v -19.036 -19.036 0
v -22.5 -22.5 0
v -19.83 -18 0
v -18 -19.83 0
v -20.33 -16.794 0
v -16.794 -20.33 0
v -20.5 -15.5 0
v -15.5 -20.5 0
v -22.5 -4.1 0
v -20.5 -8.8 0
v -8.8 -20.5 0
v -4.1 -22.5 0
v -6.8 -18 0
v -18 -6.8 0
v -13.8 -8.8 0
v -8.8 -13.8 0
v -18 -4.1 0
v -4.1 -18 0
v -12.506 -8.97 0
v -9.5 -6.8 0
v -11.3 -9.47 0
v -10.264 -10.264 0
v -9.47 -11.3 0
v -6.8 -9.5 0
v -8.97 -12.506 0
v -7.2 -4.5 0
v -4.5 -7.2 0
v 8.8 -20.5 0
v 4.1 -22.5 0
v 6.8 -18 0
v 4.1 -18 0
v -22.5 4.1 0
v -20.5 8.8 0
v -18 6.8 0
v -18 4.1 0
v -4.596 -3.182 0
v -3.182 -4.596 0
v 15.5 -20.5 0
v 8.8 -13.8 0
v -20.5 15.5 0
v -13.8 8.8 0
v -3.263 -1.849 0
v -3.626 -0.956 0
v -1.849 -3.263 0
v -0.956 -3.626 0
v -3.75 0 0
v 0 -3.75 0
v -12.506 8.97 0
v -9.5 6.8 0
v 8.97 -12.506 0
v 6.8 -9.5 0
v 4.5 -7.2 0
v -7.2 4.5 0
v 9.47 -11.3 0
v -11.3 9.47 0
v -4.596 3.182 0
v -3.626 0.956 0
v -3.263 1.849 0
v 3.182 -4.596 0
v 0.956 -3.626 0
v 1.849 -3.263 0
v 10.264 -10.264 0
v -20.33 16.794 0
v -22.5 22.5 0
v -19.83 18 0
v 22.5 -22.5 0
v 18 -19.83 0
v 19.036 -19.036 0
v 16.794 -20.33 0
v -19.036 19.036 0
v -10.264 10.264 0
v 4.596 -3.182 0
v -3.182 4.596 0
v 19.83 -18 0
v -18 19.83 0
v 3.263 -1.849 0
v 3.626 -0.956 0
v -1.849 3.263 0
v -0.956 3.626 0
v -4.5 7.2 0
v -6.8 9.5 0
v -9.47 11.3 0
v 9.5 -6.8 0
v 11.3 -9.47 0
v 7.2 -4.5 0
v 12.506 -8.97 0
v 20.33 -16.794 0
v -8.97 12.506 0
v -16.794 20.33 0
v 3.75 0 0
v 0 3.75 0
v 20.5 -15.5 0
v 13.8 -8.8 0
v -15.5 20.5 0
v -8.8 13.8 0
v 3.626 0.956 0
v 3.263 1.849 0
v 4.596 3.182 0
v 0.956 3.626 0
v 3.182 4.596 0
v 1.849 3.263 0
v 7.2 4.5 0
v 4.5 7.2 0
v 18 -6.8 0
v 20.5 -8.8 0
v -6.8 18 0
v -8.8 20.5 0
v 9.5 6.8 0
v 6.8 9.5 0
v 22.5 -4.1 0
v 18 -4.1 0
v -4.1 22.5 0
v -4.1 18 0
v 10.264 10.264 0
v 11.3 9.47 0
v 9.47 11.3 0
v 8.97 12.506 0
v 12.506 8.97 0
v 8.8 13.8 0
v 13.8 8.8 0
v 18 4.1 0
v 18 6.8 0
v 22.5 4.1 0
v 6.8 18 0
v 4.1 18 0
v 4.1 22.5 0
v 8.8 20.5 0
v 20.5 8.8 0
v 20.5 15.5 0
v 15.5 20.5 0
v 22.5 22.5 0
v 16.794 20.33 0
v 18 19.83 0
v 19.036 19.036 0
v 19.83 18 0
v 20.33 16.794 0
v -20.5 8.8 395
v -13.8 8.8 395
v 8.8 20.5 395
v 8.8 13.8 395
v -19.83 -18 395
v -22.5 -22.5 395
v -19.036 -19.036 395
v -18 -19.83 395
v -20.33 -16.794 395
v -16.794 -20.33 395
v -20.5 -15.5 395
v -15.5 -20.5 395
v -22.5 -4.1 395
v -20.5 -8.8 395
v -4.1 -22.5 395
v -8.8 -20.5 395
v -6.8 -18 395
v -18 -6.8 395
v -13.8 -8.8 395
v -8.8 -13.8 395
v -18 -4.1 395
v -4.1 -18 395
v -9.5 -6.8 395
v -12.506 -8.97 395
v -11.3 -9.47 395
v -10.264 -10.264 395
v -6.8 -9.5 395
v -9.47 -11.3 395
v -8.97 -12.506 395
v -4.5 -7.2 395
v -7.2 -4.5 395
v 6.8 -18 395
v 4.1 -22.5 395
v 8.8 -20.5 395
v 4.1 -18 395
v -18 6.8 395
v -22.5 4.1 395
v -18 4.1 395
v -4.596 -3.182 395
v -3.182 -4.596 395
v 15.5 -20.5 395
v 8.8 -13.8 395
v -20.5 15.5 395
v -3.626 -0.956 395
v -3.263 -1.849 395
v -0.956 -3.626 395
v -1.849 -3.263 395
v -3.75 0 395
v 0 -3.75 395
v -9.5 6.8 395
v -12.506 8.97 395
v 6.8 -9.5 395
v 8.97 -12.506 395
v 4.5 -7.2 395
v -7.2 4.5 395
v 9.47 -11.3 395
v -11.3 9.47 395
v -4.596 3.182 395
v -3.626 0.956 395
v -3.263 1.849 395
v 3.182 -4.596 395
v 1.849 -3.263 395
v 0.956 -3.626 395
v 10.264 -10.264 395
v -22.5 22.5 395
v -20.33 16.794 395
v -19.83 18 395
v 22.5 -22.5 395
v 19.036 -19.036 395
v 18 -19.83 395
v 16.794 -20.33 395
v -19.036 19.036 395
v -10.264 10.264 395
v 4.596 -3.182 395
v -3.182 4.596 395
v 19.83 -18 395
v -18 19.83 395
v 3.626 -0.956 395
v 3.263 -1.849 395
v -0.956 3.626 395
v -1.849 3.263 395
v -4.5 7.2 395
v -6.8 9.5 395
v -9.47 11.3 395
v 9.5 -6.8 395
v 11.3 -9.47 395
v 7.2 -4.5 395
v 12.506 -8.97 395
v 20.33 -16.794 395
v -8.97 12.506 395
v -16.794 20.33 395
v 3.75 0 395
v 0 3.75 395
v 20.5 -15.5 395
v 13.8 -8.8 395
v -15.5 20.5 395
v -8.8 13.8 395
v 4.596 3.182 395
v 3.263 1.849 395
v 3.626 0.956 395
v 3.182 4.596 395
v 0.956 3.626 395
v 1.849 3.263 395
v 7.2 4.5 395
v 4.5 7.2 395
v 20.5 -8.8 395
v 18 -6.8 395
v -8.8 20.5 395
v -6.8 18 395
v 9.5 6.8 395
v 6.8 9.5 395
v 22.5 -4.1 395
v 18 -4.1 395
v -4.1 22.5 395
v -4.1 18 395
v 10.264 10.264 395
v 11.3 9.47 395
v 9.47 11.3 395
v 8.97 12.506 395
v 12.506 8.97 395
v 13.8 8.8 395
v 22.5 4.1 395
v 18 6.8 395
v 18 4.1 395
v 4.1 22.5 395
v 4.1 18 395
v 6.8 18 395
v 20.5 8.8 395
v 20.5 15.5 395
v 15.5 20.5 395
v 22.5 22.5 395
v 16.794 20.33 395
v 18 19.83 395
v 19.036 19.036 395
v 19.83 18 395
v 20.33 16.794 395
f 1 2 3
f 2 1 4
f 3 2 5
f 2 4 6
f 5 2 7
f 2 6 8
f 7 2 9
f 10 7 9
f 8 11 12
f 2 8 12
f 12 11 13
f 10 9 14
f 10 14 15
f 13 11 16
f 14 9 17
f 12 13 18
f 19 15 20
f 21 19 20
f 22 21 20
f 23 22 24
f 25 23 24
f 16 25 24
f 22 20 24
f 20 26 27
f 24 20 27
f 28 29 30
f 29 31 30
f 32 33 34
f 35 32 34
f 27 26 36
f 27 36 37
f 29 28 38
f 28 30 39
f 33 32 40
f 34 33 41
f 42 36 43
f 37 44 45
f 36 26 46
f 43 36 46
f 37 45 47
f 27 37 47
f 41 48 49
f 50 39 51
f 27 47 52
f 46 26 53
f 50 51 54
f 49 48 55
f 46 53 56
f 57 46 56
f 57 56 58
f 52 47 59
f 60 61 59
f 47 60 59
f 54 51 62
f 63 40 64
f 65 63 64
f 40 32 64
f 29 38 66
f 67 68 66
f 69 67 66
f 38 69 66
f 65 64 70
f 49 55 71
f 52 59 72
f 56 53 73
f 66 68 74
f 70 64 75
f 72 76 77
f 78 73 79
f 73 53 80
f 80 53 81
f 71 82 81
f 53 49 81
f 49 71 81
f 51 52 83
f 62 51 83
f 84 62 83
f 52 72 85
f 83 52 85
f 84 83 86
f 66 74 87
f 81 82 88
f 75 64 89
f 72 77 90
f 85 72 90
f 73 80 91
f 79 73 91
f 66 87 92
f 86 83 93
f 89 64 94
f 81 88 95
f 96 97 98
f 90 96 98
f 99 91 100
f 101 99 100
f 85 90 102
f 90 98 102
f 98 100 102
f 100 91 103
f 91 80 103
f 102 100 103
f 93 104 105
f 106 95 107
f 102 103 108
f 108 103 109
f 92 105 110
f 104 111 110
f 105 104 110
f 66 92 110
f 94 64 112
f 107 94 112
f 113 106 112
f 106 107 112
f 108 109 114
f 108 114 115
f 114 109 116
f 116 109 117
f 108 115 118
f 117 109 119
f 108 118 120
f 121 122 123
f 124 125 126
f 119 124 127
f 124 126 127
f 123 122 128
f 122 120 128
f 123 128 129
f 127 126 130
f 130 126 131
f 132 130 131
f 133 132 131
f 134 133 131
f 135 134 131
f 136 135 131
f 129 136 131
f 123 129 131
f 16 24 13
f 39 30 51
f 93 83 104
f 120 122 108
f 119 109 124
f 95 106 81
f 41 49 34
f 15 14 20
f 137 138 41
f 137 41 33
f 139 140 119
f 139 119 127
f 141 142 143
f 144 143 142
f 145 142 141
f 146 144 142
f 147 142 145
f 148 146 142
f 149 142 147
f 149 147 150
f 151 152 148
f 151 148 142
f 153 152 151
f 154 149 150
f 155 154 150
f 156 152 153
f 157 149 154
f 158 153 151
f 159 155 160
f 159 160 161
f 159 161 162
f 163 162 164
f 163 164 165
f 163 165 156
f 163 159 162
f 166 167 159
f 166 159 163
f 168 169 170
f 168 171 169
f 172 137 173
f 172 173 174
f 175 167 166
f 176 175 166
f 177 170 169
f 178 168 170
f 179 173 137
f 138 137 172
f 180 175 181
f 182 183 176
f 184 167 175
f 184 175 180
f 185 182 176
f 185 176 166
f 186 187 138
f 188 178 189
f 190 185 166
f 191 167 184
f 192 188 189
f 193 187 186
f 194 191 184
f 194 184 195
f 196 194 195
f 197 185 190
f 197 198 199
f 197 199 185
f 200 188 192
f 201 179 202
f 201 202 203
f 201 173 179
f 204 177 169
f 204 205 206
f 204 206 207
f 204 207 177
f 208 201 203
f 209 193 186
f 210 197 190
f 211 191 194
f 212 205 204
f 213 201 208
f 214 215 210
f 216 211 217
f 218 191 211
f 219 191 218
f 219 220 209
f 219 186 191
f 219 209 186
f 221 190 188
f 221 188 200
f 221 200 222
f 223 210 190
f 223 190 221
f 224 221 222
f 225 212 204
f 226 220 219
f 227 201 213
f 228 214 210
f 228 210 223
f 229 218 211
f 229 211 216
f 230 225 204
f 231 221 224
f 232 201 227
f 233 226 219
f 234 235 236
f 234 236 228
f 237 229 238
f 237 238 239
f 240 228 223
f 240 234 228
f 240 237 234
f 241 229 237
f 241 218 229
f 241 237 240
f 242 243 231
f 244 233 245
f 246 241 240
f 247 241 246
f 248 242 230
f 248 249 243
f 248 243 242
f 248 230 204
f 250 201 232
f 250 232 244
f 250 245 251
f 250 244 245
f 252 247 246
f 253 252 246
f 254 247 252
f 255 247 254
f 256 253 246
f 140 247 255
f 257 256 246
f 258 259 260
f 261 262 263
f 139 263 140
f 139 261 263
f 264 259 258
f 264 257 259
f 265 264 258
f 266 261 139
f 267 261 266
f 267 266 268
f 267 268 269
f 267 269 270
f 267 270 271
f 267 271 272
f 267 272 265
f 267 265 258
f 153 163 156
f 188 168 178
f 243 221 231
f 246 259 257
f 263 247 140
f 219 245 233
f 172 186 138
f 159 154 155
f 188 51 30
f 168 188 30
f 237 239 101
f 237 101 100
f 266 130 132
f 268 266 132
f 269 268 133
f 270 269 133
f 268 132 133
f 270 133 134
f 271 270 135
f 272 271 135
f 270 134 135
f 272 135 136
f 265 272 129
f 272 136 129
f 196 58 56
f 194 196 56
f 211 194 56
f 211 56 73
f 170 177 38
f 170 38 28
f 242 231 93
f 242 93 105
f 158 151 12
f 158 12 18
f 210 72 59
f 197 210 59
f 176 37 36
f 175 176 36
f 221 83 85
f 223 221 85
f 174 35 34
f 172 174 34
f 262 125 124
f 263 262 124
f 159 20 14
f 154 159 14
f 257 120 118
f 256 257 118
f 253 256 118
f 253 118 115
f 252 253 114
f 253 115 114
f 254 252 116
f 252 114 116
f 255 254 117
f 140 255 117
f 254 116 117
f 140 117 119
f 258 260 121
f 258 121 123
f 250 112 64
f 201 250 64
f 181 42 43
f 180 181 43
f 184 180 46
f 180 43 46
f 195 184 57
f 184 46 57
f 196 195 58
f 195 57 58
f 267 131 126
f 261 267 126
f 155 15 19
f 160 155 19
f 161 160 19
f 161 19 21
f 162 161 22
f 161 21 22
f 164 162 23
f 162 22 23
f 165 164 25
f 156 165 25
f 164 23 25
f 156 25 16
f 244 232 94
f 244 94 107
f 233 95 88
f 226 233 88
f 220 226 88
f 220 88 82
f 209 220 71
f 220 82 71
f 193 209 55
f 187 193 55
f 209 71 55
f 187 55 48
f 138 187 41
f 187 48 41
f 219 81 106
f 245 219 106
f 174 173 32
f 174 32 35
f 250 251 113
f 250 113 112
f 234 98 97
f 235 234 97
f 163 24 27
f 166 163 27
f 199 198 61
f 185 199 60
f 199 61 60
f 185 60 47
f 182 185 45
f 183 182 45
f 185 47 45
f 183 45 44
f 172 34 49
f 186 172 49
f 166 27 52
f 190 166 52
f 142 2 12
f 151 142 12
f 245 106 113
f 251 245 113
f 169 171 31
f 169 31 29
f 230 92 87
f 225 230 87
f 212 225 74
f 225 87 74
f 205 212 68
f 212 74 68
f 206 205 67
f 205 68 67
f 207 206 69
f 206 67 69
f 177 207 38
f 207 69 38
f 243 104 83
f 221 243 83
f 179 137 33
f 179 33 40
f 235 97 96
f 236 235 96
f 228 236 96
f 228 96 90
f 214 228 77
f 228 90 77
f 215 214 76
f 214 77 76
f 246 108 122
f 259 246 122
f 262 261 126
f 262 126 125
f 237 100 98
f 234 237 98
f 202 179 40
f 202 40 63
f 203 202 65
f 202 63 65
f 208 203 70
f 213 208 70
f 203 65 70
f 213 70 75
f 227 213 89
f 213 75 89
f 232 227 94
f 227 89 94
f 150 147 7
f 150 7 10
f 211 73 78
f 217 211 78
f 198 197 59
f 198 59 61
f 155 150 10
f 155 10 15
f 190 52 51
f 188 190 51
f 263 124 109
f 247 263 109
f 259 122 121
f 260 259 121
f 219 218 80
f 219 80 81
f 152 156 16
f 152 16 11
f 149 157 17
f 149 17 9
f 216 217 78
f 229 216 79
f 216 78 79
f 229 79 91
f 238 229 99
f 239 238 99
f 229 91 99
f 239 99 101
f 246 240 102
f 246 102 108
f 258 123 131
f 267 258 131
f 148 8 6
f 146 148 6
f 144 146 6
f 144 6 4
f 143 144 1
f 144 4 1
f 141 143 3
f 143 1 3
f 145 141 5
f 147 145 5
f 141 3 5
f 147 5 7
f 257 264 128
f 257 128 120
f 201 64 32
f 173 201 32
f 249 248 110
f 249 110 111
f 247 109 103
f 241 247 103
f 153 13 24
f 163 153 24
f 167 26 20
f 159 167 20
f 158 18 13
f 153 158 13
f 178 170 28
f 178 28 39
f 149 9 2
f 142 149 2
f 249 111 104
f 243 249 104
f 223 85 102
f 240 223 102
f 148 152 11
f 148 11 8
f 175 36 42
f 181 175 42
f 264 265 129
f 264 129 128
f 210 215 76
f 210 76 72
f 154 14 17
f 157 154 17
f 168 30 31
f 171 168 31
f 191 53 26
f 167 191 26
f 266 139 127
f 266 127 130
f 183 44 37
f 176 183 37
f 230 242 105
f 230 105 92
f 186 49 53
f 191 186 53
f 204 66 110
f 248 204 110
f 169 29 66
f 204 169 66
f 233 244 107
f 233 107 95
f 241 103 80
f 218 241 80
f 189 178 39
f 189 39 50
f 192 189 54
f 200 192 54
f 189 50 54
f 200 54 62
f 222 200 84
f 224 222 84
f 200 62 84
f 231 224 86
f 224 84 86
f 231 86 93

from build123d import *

# Parameters (mm, degrees)
BOSS_EXTRUDE1_DEPTH = 395


with BuildPart() as part:
    # Sketch1 → Boss-Extrude1 (new body)
    with BuildSketch(Plane.XY):
        Polygon((-17.999999991, -6.799999991), (-17.999999991, -4.099999991), (-22.499999991, -4.099999991), (-22.499999991, -22.499999991), (-4.099999991, -22.499999991), (-4.099999991, -17.999999991), (-6.799999991, -17.999999991), (-6.799999991, -9.499999991), (-4.499999991, -7.199999991), (4.500000009, -7.199999991), (6.800000009, -9.499999991), (6.800000009, -17.999999991), (4.100000009, -17.999999991), (4.100000009, -22.499999991), (22.500000009, -22.499999991), (22.500000009, -4.099999991), (18.000000009, -4.099999991), (18.000000009, -6.799999991), (9.500000009, -6.799999991), (7.200000009, -4.499999991), (7.200000009, 4.500000009), (9.500000009, 6.800000009), (18.000000009, 6.800000009), (18.000000009, 4.100000009), (22.500000009, 4.100000009), (22.500000009, 22.500000009), (4.100000009, 22.500000009), (4.100000009, 18.000000009), (6.800000009, 18.000000009), (6.800000009, 9.500000009), (4.500000009, 7.200000009), (-4.499999991, 7.200000009), (-6.799999991, 9.500000009), (-6.799999991, 18.000000009), (-4.099999991, 18.000000009), (-4.099999991, 22.500000009), (-22.499999991, 22.500000009), (-22.499999991, 4.100000009), (-17.999999991, 4.100000009), (-17.999999991, 6.800000009), (-9.499999991, 6.800000009), (-7.199999991, 4.500000009), (-7.199999991, -4.499999991), (-9.499999991, -6.799999991), align=None)
        with BuildLine():
            Line((-20.499999973, 8.799995438), (-20.499999973, 15.500000009))
            ThreePointArc((-20.499999973, 15.500000009), (-19.035533879, 19.035533915), (-15.499999973, 20.500000009))
            Line((-15.499999973, 20.500000009), (-8.799995402, 20.500000009))
            Line((-8.799995402, 20.500000009), (-8.799995402, 13.799995438))
            ThreePointArc((-8.799995402, 13.799995438), (-10.264461496, 10.264461532), (-13.799995402, 8.799995438))
            Line((-13.799995402, 8.799995438), (-20.499999973, 8.799995438))
        make_face(mode=Mode.SUBTRACT)
        with BuildLine():
            Line((20.500000009, 8.79999542), (13.799995438, 8.79999542))
            ThreePointArc((13.799995438, 8.79999542), (10.264461532, 10.264461514), (8.799995438, 13.79999542))
            Line((8.799995438, 13.79999542), (8.799995438, 20.499999991))
            Line((8.799995438, 20.499999991), (15.500000009, 20.499999991))
            ThreePointArc((15.500000009, 20.499999991), (19.035533915, 19.035533897), (20.500000009, 15.499999991))
            Line((20.500000009, 15.499999991), (20.500000009, 8.79999542))
        make_face(mode=Mode.SUBTRACT)
        with BuildLine():
            Line((15.499999991, -20.499999991), (8.79999542, -20.499999991))
            Line((8.79999542, -20.499999991), (8.79999542, -13.79999542))
            ThreePointArc((8.79999542, -13.79999542), (10.264461514, -10.264461514), (13.79999542, -8.79999542))
            Line((13.79999542, -8.79999542), (20.499999991, -8.79999542))
            Line((20.499999991, -8.79999542), (20.499999991, -15.499999991))
            ThreePointArc((20.499999991, -15.499999991), (19.035533897, -19.035533897), (15.499999991, -20.499999991))
        make_face(mode=Mode.SUBTRACT)
        with BuildLine():
            Line((-8.79999542, -20.499999973), (-15.499999991, -20.499999973))
            ThreePointArc((-15.499999991, -20.499999973), (-19.035533897, -19.035533879), (-20.499999991, -15.499999973))
            Line((-20.499999991, -15.499999973), (-20.499999991, -8.799995402))
            Line((-20.499999991, -8.799995402), (-13.79999542, -8.799995402))
            ThreePointArc((-13.79999542, -8.799995402), (-10.264461514, -10.264461496), (-8.79999542, -13.799995402))
            Line((-8.79999542, -13.799995402), (-8.79999542, -20.499999973))
        make_face(mode=Mode.SUBTRACT)
        with BuildLine():
            Line((-3.262737816, 1.848524254), (-4.596194076, 3.181980514))
            Line((-4.596194076, 3.181980514), (-3.181980513, 4.596194076))
            Line((-3.181980513, 4.596194076), (-1.848524253, 3.262737816))
            ThreePointArc((-1.848524253, 3.262737816), (2e-09, 3.749999997), (1.848524257, 3.262737816))
            Line((1.848524257, 3.262737816), (3.181980517, 4.596194076))
            Line((3.181980517, 4.596194076), (4.59619408, 3.181980513))
            Line((4.59619408, 3.181980513), (3.26273782, 1.848524253))
            ThreePointArc((3.26273782, 1.848524253), (3.75, -2e-09), (3.262737819, -1.848524257))
            Line((3.262737819, -1.848524257), (4.596194079, -3.181980517))
            Line((4.596194079, -3.181980517), (3.181980517, -4.596194079))
            Line((3.181980517, -4.596194079), (1.848524257, -3.262737819))
            ThreePointArc((1.848524257, -3.262737819), (2e-09, -3.75), (-1.848524253, -3.262737819))
            Line((-1.848524253, -3.262737819), (-3.181980515, -4.596194081))
            Line((-3.181980515, -4.596194081), (-4.596194078, -3.181980518))
            Line((-4.596194078, -3.181980518), (-3.262737816, -1.848524257))
            ThreePointArc((-3.262737816, -1.848524257), (-3.749999997, -2e-09), (-3.262737816, 1.848524254))
        make_face(mode=Mode.SUBTRACT)
    extrude(amount=BOSS_EXTRUDE1_DEPTH)


solid = part.part
